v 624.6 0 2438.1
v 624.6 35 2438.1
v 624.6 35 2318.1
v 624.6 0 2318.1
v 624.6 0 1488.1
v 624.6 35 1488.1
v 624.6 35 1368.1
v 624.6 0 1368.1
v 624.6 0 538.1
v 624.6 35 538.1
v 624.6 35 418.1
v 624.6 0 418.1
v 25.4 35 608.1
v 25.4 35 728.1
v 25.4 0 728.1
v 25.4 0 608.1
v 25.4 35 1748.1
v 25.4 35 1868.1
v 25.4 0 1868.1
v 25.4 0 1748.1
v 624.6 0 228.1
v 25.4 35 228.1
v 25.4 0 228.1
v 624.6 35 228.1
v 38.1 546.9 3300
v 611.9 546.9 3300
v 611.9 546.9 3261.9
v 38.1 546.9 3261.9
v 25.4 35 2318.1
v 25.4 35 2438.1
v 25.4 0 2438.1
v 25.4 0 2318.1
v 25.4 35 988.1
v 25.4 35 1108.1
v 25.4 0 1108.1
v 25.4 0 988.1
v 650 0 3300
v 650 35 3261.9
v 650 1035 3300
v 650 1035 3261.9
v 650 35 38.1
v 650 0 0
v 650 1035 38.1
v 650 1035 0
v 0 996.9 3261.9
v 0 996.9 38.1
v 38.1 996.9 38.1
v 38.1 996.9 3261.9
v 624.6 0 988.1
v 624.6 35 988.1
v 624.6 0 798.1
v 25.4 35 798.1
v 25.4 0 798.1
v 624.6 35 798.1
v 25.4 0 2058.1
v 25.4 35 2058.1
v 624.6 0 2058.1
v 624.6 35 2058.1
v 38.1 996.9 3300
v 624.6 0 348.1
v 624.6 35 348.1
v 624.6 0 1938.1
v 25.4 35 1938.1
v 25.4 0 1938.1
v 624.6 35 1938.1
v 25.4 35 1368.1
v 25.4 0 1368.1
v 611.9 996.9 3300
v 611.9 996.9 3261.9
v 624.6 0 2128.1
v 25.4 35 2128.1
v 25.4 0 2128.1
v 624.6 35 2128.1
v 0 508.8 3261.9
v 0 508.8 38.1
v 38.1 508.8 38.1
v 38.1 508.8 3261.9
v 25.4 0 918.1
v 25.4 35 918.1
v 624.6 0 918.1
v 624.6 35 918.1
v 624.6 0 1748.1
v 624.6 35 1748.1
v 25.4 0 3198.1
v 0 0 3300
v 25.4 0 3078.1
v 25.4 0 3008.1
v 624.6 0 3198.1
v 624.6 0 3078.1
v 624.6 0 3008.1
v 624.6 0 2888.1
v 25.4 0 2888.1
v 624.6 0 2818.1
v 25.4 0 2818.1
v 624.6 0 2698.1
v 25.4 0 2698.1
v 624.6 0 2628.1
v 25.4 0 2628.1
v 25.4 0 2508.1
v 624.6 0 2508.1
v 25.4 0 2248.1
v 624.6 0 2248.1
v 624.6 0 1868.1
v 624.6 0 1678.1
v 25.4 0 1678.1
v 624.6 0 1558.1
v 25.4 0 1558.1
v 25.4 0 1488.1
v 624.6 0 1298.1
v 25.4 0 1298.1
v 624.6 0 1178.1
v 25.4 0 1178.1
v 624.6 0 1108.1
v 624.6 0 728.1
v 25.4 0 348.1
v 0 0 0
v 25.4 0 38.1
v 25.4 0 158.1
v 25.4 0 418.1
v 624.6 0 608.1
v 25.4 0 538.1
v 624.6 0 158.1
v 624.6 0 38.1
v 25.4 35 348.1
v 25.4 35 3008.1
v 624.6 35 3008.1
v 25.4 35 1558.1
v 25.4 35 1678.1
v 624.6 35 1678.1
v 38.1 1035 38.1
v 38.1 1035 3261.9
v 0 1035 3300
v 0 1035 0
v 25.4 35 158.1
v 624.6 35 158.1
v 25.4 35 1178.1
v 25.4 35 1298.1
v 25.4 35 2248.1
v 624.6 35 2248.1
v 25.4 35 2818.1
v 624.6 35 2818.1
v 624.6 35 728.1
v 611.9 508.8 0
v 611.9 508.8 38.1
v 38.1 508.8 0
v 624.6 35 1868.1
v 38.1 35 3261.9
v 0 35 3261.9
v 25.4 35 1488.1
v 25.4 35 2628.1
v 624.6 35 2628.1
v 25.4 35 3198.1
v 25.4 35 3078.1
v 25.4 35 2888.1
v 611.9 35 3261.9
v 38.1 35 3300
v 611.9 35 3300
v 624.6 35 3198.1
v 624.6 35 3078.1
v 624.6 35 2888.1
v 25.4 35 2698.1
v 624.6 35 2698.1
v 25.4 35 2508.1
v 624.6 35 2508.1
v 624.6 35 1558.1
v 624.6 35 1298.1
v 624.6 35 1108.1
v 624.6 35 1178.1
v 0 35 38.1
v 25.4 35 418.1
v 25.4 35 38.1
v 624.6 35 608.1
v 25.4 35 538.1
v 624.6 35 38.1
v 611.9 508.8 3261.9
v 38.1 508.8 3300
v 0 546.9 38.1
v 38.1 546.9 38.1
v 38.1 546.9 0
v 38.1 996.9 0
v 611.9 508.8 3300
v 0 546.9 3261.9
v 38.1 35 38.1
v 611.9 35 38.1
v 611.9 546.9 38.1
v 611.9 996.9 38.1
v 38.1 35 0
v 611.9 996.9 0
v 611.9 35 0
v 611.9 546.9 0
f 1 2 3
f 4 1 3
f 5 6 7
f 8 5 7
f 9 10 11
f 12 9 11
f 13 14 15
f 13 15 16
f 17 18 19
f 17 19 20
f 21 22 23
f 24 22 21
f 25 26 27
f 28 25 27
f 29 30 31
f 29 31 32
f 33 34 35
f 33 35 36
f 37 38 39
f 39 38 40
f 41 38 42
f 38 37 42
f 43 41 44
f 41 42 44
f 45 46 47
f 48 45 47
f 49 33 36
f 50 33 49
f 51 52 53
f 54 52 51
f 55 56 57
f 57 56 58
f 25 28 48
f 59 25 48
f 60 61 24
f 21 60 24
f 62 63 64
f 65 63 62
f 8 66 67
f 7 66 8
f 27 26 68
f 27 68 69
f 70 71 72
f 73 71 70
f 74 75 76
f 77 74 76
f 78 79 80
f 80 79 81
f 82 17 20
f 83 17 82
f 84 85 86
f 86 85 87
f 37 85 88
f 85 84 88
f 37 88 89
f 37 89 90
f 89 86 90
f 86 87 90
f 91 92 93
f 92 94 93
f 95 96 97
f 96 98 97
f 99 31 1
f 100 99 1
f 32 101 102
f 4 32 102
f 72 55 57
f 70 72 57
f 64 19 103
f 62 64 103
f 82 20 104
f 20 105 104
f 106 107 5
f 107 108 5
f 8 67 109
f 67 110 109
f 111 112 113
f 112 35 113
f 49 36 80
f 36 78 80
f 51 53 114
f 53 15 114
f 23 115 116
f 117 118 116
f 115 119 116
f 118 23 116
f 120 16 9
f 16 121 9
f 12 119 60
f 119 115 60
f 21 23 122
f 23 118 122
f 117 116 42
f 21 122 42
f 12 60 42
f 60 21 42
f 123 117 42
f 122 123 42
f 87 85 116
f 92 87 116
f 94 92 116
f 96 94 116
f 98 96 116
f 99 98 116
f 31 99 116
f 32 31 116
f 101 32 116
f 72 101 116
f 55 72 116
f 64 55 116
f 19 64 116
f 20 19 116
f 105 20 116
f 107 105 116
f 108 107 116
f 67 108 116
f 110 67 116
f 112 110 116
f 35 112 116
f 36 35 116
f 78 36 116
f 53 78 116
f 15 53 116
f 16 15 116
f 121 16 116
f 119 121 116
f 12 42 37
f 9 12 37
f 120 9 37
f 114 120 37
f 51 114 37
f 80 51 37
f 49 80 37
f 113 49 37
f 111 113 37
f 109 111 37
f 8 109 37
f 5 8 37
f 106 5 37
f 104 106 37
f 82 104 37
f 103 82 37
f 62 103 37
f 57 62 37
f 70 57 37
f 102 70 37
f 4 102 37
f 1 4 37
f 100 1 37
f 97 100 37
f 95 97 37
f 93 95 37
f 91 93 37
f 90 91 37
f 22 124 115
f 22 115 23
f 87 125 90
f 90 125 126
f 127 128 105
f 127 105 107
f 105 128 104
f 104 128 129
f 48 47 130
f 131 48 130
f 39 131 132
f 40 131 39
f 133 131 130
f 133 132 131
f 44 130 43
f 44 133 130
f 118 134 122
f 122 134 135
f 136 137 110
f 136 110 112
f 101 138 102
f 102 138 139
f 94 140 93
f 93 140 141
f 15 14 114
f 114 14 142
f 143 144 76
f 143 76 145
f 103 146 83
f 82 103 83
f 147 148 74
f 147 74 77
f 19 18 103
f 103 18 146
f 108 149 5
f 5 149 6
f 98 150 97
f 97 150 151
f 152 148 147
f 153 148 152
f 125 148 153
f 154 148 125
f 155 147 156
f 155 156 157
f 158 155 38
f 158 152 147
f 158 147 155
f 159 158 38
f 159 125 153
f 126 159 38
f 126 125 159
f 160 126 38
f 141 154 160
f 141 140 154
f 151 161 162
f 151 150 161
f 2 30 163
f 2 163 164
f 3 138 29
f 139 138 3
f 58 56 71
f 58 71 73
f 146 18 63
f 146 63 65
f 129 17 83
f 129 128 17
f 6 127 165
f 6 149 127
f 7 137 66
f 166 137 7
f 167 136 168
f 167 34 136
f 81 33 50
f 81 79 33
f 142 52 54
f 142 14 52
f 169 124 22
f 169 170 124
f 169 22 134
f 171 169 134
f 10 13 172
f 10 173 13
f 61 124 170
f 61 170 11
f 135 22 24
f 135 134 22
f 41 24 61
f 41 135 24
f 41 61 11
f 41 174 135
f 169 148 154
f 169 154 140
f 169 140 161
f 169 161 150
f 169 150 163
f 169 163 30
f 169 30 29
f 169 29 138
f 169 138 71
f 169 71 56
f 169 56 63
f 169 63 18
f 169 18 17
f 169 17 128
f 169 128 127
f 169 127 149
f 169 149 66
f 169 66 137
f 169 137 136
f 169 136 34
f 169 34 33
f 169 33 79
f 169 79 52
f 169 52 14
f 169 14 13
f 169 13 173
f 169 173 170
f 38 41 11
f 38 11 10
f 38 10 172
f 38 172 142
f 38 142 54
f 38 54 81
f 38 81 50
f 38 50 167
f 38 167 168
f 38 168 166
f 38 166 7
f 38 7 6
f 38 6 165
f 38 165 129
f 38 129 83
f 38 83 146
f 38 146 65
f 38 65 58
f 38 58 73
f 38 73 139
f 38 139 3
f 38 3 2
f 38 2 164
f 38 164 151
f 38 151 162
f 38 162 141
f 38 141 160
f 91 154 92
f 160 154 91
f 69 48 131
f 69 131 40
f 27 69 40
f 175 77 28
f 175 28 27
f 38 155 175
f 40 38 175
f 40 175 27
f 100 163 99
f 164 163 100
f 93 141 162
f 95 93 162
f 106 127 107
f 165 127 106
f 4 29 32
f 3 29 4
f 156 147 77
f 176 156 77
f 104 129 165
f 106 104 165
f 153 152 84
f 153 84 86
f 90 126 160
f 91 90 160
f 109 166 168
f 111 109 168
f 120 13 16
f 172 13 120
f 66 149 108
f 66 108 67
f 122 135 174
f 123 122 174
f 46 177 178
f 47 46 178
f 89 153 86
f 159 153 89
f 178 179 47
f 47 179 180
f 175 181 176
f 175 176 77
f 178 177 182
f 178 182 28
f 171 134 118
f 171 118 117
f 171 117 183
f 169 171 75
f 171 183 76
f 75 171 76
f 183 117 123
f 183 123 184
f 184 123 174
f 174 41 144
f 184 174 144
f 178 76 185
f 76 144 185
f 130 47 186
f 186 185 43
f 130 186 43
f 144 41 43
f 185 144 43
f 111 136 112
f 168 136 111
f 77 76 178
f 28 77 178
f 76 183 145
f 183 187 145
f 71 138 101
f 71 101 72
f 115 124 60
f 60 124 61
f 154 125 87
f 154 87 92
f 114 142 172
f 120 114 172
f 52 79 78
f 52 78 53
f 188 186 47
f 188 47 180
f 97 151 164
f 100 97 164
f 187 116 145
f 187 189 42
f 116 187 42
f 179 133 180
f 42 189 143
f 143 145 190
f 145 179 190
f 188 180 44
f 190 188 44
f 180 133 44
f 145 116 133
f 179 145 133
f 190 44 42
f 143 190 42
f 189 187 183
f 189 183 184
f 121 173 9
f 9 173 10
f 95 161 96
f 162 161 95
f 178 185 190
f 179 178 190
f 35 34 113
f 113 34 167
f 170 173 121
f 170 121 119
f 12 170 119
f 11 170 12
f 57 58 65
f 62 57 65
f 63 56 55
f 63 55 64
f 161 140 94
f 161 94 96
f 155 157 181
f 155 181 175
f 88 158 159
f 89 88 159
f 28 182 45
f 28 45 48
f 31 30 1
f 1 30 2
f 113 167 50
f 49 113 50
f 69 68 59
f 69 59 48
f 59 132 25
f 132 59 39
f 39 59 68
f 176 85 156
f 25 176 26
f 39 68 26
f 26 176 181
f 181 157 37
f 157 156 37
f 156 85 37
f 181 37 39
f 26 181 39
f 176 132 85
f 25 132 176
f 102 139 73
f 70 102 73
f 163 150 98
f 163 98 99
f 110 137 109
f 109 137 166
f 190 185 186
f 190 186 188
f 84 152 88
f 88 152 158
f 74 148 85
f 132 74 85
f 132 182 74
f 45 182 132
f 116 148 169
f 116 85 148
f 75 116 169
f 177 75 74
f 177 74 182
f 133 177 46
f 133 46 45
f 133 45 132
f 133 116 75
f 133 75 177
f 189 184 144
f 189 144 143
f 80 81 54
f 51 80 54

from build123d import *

# Parameters (mm, degrees)
CROQUIS1_W              = 650
CROQUIS1_H              = 35
SALIENTE_EXTRUIR1_DEPTH = 3300
CROQUIS2_W              = 599.2
CROQUIS2_H              = 120
CORTAR_EXTRUIR1_DEPTH   = 3000
MATRIZL1_COUNT          = 17
MATRIZL1_PITCH          = 190
CROQUIS3_W              = 38.1
CROQUIS3_H              = 38.1
SALIENTE_EXTRUIR2_DEPTH = 1000
CROQUIS4_W              = 38.1
CROQUIS4_H              = 38.1
SALIENTE_EXTRUIR3_DEPTH = 3250
CROQUIS5_W              = 38.1
CROQUIS5_H              = 38.1
SALIENTE_EXTRUIR4_DEPTH = 3250
CROQUIS6_W              = 38.1
CROQUIS6_H              = 38.1
SALIENTE_EXTRUIR5_DEPTH = 630
CROQUIS7_W              = 38.1
CROQUIS7_H              = 38.1
SALIENTE_EXTRUIR6_DEPTH = 630
CROQUIS8_W              = 38.1
CROQUIS8_H              = 38.1
SALIENTE_EXTRUIR7_DEPTH = 630


with BuildPart() as part:
    # Croquis1 → Saliente-Extruir1 (new body)
    with BuildSketch(Plane.XY):
        with Locations((325, 17.5)):
            Rectangle(CROQUIS1_W, CROQUIS1_H)
    extrude(amount=SALIENTE_EXTRUIR1_DEPTH)

    # Croquis2 → Cortar-Extruir1 (cut)
    with BuildSketch(Plane(origin=(0, 35, 0), x_dir=(1, 0, 0), z_dir=(0, 1, 0))):
        with Locations((325, -98.1)):
            Rectangle(CROQUIS2_W, CROQUIS2_H)
    cortar_extruir1 = extrude(amount=-CORTAR_EXTRUIR1_DEPTH, mode=Mode.SUBTRACT)

    # MatrizL1: Cortar-Extruir1 ×17
    with Locations(*[(0, 0, i * MATRIZL1_PITCH) for i in range(1, MATRIZL1_COUNT)]):
        add(cortar_extruir1, mode=Mode.SUBTRACT)

    # Croquis3 → Saliente-Extruir2 (add)
    with BuildSketch(Plane(origin=(0, 35, 0), x_dir=(1, 0, 0), z_dir=(0, 1, 0))):
        with Locations((19.05, -3280.95)):
            Rectangle(CROQUIS3_W, CROQUIS3_H)
        with Locations((630.95, -3280.95)):
            Rectangle(CROQUIS3_W, CROQUIS3_H)
        with Locations((19.05, -19.05)):
            Rectangle(CROQUIS3_W, CROQUIS3_H)
        with Locations((630.95, -19.05)):
            Rectangle(CROQUIS3_W, CROQUIS3_H)
    extrude(amount=SALIENTE_EXTRUIR2_DEPTH)

    # Croquis4 → Saliente-Extruir3 (add)
    with BuildSketch(Plane.XY.offset(38.1)):
        with Locations((19.05, 1015.95)):
            Rectangle(CROQUIS4_W, CROQUIS4_H)
    extrude(amount=SALIENTE_EXTRUIR3_DEPTH)

    # Croquis5 → Saliente-Extruir4 (add)
    with BuildSketch(Plane.XY.offset(38.1)):
        with Locations((19.05, 527.85)):
            Rectangle(CROQUIS5_W, CROQUIS5_H)
    extrude(amount=SALIENTE_EXTRUIR4_DEPTH)

    # Croquis6 → Saliente-Extruir5 (add)
    with BuildSketch(Plane(origin=(650, 0, 0), x_dir=(0, 0, -1), z_dir=(1, 0, 0))):
        with Locations((-19.05, 1015.95)):
            Rectangle(CROQUIS6_W, CROQUIS6_H)
    extrude(amount=-SALIENTE_EXTRUIR5_DEPTH)

    # Croquis7 → Saliente-Extruir6 (add)
    with BuildSketch(Plane(origin=(650, 0, 0), x_dir=(0, 0, -1), z_dir=(1, 0, 0))):
        with Locations((-3280.95, 1015.95)):
            Rectangle(CROQUIS7_W, CROQUIS7_H)
    extrude(amount=-SALIENTE_EXTRUIR6_DEPTH)

    # Croquis8 → Saliente-Extruir7 (add)
    with BuildSketch(Plane(origin=(650, 0, 0), x_dir=(0, 0, -1), z_dir=(1, 0, 0))):
        with Locations((-19.05, 527.85)):
            Rectangle(CROQUIS8_W, CROQUIS8_H)
        with Locations((-3280.95, 527.85)):
            Rectangle(CROQUIS8_W, CROQUIS8_H)
    extrude(amount=-SALIENTE_EXTRUIR7_DEPTH)


solid = part.part
